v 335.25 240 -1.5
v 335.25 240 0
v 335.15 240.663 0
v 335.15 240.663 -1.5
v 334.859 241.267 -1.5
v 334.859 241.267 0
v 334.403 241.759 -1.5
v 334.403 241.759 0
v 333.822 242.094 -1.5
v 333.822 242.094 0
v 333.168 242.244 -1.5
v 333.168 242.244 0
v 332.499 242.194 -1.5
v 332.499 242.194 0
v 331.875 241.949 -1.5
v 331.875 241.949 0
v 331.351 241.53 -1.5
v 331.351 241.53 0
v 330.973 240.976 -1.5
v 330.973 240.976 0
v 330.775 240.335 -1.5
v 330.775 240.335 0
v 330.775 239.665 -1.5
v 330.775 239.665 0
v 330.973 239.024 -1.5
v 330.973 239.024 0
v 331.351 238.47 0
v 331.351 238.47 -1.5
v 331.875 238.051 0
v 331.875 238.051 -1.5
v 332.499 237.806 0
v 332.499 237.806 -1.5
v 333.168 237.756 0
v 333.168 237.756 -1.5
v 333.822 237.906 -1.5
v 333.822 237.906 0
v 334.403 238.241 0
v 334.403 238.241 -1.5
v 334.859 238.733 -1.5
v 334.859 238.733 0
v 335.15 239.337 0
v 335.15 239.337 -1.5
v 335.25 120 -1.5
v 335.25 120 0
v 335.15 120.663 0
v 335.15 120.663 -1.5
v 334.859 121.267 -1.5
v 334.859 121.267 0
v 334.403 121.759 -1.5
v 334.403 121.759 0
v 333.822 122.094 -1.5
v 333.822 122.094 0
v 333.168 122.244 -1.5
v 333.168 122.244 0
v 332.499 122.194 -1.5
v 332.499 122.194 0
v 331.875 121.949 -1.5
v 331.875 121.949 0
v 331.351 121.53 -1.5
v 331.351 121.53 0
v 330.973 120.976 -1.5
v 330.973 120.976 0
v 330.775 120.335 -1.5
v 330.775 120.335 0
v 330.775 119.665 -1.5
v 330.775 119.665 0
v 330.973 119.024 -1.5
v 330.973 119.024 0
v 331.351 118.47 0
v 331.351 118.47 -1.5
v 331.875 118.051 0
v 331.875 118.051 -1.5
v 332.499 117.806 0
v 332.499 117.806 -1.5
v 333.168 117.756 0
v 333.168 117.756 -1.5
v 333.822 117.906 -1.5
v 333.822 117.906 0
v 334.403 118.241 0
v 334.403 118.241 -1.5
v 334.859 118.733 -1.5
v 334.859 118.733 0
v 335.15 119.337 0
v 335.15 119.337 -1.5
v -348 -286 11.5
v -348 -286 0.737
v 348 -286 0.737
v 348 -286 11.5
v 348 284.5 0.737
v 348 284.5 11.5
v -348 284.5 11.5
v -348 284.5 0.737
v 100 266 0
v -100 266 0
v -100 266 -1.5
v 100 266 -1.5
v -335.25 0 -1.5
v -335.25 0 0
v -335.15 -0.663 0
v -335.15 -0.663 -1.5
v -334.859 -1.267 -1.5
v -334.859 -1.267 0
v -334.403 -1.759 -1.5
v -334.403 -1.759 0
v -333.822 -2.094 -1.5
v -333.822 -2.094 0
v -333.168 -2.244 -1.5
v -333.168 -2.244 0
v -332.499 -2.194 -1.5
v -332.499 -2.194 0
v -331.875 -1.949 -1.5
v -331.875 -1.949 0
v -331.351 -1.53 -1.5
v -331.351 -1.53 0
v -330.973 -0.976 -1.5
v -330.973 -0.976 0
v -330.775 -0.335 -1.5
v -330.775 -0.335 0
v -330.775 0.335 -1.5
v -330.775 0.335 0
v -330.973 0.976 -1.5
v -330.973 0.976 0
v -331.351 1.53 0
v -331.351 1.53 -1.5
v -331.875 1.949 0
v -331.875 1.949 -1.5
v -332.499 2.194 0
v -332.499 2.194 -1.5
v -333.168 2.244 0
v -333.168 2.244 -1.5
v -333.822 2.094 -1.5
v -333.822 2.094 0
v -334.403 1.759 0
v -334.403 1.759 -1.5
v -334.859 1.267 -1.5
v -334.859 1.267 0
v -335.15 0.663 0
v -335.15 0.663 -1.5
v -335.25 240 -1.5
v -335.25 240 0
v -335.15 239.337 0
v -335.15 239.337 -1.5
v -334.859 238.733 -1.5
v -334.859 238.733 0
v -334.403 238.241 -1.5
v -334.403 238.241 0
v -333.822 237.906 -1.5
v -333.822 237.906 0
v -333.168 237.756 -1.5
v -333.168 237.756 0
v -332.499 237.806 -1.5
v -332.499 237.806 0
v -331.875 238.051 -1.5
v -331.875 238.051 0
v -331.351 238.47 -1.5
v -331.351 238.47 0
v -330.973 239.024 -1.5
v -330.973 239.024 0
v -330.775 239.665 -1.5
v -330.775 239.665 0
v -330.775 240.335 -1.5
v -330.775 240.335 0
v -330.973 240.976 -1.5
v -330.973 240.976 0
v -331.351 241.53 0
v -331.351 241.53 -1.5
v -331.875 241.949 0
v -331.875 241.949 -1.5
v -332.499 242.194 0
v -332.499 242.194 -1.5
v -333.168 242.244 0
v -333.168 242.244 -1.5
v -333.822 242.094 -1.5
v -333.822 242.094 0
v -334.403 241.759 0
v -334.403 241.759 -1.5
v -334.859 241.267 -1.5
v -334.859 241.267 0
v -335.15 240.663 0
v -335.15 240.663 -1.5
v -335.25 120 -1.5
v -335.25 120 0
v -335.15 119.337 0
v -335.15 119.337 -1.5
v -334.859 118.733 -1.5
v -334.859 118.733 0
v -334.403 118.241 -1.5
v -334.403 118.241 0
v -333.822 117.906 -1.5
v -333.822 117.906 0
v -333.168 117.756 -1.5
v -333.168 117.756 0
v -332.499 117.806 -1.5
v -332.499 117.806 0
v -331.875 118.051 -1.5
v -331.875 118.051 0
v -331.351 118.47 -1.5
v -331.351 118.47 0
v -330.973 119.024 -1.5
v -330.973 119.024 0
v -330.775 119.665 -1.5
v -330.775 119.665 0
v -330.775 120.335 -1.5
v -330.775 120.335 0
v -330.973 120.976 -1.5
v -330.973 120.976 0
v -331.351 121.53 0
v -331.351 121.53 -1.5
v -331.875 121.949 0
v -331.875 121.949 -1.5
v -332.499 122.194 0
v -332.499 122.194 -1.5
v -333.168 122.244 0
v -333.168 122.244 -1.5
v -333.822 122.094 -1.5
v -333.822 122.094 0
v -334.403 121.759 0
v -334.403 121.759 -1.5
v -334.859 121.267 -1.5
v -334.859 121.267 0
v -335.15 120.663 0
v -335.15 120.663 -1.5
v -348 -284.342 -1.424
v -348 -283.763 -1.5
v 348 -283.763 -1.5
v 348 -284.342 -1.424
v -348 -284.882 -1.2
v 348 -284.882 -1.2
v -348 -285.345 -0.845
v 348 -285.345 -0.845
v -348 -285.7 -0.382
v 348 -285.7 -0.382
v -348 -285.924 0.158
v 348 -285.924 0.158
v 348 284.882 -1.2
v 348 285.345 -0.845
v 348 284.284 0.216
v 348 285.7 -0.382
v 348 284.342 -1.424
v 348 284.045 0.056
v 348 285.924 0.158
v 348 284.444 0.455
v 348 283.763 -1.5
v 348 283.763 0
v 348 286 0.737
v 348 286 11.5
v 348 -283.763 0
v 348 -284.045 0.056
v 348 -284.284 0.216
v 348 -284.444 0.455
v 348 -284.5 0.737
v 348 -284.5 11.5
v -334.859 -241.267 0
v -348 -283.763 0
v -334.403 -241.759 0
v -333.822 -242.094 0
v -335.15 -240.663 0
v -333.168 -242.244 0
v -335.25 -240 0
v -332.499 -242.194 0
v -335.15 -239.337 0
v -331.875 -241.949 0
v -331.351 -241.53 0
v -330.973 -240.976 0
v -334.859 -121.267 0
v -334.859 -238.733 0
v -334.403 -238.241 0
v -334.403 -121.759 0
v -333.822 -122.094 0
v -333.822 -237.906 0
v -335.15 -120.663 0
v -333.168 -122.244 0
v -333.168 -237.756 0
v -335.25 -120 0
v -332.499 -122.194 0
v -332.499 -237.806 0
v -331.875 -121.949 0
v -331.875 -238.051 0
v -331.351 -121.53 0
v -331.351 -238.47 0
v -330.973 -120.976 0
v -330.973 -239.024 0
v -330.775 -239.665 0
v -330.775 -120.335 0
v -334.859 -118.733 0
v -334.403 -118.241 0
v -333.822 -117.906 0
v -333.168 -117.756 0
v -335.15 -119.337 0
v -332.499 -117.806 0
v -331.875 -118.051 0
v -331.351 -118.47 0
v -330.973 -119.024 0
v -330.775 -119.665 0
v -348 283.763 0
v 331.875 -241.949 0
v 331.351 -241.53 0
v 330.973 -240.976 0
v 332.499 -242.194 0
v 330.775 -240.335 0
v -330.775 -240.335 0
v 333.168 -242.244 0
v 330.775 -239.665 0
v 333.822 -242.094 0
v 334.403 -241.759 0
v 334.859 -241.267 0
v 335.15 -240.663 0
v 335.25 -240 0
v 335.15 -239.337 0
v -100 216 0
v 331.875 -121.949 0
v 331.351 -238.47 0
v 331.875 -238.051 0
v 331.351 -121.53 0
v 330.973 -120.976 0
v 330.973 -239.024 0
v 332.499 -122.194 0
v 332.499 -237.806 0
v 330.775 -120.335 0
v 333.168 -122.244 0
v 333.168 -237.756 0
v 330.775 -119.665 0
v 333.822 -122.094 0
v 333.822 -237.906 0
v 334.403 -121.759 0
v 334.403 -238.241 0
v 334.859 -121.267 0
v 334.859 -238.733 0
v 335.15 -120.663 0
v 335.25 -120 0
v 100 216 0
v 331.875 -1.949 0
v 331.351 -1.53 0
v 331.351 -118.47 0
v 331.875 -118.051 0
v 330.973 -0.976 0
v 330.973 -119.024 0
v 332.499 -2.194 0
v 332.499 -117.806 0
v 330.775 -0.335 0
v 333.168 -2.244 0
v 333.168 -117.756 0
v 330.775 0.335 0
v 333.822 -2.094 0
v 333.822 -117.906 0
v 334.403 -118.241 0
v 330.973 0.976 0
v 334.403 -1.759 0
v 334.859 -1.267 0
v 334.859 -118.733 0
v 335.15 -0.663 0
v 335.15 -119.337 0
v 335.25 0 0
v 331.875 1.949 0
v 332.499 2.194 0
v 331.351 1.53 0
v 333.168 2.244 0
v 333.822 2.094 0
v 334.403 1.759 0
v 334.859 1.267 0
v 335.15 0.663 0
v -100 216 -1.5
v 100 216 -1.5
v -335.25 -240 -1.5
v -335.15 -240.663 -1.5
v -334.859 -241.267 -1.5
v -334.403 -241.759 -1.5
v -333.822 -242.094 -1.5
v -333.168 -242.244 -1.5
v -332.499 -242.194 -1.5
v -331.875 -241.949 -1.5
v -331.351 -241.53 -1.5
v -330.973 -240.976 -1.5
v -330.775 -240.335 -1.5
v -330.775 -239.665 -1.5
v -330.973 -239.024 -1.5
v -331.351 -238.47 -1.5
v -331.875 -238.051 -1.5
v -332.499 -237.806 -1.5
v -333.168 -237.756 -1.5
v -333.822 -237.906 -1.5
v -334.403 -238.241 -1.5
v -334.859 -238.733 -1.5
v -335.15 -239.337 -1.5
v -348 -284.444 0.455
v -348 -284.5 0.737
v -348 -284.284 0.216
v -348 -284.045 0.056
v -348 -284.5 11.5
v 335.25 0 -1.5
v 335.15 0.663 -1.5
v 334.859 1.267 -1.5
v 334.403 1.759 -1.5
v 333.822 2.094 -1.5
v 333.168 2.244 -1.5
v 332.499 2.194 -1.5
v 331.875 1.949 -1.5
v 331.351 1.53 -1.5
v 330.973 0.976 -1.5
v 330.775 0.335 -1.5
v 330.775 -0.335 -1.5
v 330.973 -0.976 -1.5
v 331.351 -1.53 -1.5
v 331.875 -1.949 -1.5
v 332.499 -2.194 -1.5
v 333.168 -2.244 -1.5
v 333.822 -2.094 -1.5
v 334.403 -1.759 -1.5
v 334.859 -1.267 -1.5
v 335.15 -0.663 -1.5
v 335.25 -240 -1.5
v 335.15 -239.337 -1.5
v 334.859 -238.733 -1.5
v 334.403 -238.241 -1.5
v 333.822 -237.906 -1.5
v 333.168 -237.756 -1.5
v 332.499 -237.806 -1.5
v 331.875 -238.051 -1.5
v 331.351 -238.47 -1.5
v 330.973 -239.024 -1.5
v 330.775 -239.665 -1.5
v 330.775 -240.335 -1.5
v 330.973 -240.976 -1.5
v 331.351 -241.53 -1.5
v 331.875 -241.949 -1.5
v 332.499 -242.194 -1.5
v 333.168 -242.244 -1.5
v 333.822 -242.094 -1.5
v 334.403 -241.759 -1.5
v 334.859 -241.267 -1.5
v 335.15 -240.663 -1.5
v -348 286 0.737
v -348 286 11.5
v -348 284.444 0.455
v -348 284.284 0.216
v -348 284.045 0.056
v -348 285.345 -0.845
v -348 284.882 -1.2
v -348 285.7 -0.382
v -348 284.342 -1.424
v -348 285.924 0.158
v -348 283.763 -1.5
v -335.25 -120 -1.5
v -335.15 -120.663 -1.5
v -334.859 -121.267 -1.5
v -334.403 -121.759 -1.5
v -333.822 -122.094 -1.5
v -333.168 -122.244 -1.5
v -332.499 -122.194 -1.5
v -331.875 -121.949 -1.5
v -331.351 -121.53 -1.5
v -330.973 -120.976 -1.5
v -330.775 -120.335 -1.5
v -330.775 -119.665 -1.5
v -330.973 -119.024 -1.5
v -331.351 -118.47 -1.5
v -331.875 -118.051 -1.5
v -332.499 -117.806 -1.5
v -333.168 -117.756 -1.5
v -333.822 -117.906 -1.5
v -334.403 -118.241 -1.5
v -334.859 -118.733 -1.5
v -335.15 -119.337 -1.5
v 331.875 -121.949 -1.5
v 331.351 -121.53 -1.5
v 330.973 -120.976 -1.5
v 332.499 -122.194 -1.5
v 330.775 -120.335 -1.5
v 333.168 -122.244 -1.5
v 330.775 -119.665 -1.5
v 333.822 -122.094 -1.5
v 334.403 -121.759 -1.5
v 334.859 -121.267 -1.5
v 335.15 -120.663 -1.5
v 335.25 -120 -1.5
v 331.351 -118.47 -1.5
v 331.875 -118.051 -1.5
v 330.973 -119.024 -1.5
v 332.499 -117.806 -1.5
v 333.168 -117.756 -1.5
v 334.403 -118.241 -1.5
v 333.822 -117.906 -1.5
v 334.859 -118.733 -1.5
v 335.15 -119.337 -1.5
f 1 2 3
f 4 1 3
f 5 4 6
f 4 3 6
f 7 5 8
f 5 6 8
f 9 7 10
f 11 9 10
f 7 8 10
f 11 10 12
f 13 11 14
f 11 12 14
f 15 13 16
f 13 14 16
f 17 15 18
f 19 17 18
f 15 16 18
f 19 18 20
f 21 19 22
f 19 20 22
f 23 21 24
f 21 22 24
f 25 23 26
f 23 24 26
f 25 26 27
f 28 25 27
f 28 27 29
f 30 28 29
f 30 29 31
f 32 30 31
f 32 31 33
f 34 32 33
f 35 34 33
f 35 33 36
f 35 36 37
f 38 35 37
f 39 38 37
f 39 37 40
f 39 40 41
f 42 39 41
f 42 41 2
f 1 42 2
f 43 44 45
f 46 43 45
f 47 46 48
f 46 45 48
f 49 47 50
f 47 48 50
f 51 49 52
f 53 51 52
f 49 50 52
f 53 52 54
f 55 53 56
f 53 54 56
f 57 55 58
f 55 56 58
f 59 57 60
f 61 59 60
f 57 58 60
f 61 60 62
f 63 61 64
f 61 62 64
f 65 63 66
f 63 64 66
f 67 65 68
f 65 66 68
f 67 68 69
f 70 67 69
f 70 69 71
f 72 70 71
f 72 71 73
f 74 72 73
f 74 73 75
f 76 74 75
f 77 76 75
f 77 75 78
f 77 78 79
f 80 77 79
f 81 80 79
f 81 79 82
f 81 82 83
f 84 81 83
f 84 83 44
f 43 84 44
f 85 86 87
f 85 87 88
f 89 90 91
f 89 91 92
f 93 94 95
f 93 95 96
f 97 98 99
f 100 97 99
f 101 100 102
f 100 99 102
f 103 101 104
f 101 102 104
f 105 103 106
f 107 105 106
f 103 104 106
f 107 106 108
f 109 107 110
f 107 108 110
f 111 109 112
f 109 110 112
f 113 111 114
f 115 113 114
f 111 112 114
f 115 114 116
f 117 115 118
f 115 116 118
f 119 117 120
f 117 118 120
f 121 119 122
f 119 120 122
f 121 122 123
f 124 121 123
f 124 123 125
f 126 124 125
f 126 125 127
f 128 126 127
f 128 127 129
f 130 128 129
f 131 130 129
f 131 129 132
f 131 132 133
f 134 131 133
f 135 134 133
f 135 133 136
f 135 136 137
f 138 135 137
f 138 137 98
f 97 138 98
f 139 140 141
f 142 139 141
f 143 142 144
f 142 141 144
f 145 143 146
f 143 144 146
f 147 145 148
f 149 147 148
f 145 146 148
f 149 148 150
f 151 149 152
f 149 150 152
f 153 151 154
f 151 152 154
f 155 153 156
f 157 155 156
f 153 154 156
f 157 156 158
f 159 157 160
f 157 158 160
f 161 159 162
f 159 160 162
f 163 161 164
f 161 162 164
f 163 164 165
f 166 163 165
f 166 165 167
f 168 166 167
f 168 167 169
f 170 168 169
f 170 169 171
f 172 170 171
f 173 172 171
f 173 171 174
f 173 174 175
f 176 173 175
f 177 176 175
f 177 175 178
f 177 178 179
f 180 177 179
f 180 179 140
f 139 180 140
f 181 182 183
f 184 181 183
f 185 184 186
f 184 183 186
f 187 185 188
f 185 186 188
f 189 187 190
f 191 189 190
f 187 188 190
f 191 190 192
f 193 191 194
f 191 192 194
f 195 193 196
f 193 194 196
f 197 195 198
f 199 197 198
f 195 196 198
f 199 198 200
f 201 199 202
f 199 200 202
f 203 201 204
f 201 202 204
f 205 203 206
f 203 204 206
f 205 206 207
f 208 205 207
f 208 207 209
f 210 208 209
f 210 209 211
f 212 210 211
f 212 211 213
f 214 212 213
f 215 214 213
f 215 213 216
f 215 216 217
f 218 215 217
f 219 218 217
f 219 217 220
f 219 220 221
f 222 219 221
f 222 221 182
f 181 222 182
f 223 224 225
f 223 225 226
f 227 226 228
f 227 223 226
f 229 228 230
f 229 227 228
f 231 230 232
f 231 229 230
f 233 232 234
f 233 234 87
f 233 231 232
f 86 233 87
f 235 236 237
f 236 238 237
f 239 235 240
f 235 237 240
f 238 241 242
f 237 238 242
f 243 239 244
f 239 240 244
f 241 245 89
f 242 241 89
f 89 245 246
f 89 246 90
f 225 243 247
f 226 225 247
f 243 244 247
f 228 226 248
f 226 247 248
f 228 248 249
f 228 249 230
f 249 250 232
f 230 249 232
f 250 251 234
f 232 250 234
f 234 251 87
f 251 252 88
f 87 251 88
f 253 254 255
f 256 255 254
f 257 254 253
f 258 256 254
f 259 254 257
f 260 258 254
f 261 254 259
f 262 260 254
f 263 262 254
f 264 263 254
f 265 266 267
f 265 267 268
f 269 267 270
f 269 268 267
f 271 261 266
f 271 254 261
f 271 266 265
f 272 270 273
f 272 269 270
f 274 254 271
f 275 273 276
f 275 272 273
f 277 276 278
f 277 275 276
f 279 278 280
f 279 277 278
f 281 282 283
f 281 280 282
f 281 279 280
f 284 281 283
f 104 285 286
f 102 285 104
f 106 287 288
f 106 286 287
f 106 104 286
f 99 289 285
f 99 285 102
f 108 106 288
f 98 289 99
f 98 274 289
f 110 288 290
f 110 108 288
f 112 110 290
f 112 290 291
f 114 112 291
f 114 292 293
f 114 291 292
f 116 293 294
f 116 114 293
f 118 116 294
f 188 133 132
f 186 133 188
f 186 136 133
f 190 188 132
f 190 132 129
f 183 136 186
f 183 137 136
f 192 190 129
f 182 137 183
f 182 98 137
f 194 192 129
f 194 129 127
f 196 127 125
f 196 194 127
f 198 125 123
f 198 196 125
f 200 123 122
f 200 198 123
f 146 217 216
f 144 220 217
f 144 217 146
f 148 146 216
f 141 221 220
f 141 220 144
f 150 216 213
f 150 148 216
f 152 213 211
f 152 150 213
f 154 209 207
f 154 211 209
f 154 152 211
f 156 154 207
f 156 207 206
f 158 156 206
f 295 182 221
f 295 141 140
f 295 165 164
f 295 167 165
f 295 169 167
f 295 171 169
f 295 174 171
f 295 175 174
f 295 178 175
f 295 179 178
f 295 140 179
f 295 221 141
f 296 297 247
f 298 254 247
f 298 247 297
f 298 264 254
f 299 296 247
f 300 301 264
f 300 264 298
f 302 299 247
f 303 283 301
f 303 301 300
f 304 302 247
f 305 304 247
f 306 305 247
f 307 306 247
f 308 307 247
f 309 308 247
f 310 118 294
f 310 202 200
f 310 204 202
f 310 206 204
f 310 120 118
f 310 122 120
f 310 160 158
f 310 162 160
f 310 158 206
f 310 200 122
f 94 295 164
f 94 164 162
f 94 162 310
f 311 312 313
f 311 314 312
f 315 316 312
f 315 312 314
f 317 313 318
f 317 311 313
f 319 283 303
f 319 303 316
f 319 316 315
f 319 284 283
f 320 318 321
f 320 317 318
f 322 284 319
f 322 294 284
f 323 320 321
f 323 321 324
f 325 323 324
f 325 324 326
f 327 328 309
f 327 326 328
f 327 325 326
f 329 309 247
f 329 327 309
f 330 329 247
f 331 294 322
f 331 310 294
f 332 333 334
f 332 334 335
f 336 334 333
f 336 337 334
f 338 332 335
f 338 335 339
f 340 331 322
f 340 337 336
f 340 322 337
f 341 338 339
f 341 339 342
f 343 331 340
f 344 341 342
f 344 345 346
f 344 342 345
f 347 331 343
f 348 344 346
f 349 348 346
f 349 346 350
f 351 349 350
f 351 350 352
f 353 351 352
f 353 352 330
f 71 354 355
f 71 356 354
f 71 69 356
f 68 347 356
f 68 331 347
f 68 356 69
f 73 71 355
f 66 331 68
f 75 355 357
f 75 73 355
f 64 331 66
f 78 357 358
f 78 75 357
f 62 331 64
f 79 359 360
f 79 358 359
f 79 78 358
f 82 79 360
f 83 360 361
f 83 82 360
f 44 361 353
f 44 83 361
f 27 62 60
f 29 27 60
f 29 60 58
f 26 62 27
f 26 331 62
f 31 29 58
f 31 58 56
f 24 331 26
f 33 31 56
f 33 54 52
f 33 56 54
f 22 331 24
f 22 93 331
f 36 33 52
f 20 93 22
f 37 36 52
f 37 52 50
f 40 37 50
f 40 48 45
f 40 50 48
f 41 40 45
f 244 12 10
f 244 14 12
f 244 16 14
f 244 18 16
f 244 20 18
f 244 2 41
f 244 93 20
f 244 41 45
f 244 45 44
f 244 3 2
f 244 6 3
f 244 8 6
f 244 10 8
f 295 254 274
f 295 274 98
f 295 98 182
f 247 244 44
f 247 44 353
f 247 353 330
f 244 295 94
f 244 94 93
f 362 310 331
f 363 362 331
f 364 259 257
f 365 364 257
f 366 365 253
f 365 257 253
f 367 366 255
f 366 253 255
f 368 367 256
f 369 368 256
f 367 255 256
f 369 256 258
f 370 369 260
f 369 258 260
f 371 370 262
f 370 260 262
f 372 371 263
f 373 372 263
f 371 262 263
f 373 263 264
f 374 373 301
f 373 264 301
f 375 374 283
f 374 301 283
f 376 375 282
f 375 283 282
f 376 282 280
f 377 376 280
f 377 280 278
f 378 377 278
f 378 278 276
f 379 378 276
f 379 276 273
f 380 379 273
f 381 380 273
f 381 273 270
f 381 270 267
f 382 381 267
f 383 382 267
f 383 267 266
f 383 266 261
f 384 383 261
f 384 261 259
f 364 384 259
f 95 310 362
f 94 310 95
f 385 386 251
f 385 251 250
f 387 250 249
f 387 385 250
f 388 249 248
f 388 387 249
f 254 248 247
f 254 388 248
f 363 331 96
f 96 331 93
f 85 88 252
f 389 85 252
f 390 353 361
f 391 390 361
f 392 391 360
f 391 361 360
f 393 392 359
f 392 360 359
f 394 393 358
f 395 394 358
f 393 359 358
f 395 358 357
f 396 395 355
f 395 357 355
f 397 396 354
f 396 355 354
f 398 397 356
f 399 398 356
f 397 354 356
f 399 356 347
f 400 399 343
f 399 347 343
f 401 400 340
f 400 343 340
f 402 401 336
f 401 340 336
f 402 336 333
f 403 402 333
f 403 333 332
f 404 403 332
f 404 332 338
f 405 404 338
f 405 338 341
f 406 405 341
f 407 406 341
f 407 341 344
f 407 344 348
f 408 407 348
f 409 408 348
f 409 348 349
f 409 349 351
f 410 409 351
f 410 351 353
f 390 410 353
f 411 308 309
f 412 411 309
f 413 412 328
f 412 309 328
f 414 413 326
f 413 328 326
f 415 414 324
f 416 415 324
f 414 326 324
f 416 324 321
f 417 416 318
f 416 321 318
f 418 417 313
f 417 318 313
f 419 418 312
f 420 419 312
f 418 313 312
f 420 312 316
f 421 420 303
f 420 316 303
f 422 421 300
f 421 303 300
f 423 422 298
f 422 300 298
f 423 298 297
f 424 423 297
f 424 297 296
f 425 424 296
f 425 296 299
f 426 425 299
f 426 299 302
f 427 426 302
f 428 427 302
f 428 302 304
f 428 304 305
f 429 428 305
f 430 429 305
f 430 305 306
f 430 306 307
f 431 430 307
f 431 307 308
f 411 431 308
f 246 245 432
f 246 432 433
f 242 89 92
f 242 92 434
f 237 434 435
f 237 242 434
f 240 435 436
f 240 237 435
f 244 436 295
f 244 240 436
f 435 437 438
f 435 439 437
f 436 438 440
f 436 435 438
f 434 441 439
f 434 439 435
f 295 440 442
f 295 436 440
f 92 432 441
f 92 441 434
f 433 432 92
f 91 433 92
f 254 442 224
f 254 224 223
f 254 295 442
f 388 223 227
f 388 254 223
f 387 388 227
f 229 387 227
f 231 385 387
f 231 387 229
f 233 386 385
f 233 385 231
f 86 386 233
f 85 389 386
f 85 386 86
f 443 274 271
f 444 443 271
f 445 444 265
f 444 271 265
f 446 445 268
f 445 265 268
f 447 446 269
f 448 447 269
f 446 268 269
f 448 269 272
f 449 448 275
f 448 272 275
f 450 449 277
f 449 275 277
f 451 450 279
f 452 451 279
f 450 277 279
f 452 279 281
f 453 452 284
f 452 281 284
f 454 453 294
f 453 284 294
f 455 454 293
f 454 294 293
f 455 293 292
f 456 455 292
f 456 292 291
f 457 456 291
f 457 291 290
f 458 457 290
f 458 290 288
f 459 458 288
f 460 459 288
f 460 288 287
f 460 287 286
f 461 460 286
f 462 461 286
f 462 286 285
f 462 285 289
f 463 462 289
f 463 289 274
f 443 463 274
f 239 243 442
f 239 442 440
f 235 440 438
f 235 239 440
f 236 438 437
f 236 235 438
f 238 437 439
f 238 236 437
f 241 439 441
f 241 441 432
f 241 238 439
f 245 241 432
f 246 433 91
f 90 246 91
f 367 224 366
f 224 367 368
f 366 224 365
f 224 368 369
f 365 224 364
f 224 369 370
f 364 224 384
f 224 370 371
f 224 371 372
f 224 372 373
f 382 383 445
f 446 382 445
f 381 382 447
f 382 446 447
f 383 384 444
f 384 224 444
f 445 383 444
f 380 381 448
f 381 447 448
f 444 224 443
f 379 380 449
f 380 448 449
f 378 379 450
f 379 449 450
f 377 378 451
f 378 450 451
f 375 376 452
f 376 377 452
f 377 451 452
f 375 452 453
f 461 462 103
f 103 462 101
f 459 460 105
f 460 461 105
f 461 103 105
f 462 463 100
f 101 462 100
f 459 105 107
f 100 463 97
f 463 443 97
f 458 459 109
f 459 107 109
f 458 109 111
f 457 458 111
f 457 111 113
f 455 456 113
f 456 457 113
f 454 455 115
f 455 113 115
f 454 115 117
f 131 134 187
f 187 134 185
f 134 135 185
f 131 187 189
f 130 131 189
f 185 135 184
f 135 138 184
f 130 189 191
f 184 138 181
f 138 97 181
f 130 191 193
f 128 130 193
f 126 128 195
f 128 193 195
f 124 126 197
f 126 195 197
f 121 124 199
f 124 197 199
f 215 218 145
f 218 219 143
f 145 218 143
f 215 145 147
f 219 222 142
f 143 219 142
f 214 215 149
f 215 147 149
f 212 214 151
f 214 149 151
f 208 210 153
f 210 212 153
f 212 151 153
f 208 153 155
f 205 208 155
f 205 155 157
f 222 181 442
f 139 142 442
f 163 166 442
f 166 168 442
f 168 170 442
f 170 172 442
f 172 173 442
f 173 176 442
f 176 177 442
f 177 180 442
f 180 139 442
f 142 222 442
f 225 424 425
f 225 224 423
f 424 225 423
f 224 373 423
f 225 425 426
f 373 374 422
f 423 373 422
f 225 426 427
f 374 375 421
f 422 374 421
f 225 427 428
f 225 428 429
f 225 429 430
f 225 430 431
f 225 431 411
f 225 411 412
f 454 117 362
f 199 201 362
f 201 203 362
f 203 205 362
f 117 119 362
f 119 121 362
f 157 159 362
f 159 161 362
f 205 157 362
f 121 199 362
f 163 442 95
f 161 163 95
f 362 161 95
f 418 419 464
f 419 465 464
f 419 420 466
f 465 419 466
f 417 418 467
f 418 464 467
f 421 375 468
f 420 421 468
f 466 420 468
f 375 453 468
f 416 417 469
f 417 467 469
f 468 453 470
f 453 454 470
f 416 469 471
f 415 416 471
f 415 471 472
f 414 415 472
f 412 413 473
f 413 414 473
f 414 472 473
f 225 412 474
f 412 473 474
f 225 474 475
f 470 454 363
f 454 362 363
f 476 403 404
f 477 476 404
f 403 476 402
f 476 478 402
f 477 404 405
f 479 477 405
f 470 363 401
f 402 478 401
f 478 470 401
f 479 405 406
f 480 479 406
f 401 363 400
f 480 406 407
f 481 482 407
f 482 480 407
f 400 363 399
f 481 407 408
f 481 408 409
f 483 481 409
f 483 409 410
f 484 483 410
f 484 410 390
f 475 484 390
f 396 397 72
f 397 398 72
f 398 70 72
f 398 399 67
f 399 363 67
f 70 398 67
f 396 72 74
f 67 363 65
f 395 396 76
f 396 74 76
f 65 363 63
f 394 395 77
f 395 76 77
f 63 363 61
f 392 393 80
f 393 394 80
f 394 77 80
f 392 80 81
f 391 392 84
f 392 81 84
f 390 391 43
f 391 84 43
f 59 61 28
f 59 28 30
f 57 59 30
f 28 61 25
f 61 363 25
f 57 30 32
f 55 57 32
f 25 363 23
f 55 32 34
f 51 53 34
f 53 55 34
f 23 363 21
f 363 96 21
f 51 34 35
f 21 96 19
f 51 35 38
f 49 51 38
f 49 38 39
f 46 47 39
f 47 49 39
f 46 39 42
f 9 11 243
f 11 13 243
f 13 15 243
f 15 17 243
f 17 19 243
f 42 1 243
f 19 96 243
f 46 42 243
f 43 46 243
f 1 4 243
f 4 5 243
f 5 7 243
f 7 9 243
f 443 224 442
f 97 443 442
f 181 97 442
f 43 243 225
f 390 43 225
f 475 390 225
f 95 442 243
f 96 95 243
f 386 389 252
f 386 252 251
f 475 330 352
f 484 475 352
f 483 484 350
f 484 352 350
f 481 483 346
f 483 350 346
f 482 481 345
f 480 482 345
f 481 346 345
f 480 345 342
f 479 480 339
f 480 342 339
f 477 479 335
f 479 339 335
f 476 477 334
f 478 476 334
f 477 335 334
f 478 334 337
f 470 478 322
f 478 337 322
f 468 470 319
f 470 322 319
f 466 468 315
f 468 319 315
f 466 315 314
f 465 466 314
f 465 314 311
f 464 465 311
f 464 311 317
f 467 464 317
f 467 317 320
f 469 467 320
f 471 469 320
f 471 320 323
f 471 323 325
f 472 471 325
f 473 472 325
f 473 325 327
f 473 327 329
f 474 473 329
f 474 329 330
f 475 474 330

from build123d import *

# Parameters (mm, degrees)
SKETCH_1_W                         = 696
SKETCH_1_H                         = 572
SM_BASE_FLANGE_1_DEPTH             = 1.5
SM_EDGE_FLANGE_1_STRIP_W           = 7.4732
SM_EDGE_FLANGE_1_STRIP_H           = 1.5
SM_EDGE_FLANGE_1_STRIP_CUT_DEPTH   = 696
SM_EDGE_FLANGE_1_STRIP_2_W         = 7.4732
SM_EDGE_FLANGE_1_STRIP_2_H         = 1.5
SM_EDGE_FLANGE_1_STRIP_CUT_2_DEPTH = 696
SM_EDGE_FLANGE_1_DEPTH             = 696
SM_EDGE_FLANGE_1_BEND_DEPTH        = 696
SKETCH_8_R                         = 2.25
CUT_EXTRUDE_1_DEPTH                = 10
PATTERN_LINEAR_1_COUNT             = 3
PATTERN_LINEAR_1_PITCH             = 120
PATTERN_LINEAR_1_COL_COUNT         = 3
PATTERN_LINEAR_1_COL_PITCH         = 120
SKETCH_9_W                         = 200
SKETCH_9_H                         = 50
CUT_EXTRUDE_2_DEPTH                = 10


# Sheet-metal steps are written as plain solids
with BuildPart() as part:
    # Sketch 1 → Базовая кромка1 (new body)
    with BuildSketch(Plane.XY):
        Rectangle(SKETCH_1_W, SKETCH_1_H)
    extrude(amount=-SM_BASE_FLANGE_1_DEPTH)

    # Ребро-кромка1 strip (across the edge) → Ребро-кромка1 strip cut (cut)
    with BuildSketch(Plane(origin=(348, 286, 0), x_dir=(0, -1, 0), z_dir=(-1, 0, 0))):
        with Locations((-1.5, -0.75)):
            Rectangle(SM_EDGE_FLANGE_1_STRIP_W, SM_EDGE_FLANGE_1_STRIP_H)
    extrude(amount=SM_EDGE_FLANGE_1_STRIP_CUT_DEPTH, mode=Mode.SUBTRACT)

    # Ребро-кромка1 strip 2 (across the edge) → Ребро-кромка1 strip cut 2 (cut)
    with BuildSketch(Plane(origin=(-348, -286, 0), x_dir=(0, 1, 0), z_dir=(1, 0, 0))):
        with Locations((-1.5, -0.75)):
            Rectangle(SM_EDGE_FLANGE_1_STRIP_2_W, SM_EDGE_FLANGE_1_STRIP_2_H)
    extrude(amount=SM_EDGE_FLANGE_1_STRIP_CUT_2_DEPTH, mode=Mode.SUBTRACT)

    # Ребро-кромка1 section (across the edge) → Ребро-кромка1 (add)
    with BuildSketch(Plane(origin=(348, 286, 0), x_dir=(0, -1, 0), z_dir=(-1, 0, 0))):
        with BuildLine():
            Line((0, 0.7366), (0, 11.5))
            Line((0, 11.5), (1.5, 11.5))
            Line((1.5, 11.5), (1.5, 0.7366))
            ThreePointArc((1.5, 0.7366), (1.715745145, 0.215745145), (2.2366, 0))
            Line((2.2366, 0), (2.2366, -1.5))
            ThreePointArc((2.2366, -1.5), (0.655084973, -0.844915027), (0, 0.7366))
        make_face()
    extrude(amount=SM_EDGE_FLANGE_1_DEPTH)

    # Ребро-кромка1 section 2 (across the edge) → Ребро-кромка1 bend (add)
    with BuildSketch(Plane(origin=(-348, -286, 0), x_dir=(0, 1, 0), z_dir=(1, 0, 0))):
        with BuildLine():
            Line((0, 0.7366), (0, 11.5))
            Line((0, 11.5), (1.5, 11.5))
            Line((1.5, 11.5), (1.5, 0.7366))
            ThreePointArc((1.5, 0.7366), (1.715745145, 0.215745145), (2.2366, 0))
            Line((2.2366, 0), (2.2366, -1.5))
            ThreePointArc((2.2366, -1.5), (0.655084973, -0.844915027), (0, 0.7366))
        make_face()
    extrude(amount=SM_EDGE_FLANGE_1_BEND_DEPTH)

    # Эскиз8 → Вырез-Вытянуть1 (cut)
    with BuildSketch(Plane.XY):
        with Locations((333, 0)):
            Circle(SKETCH_8_R)
        with Locations(Location((-333, 0, 0), (0, 0, 180))):
            Circle(SKETCH_8_R)
    cut_extrude_1 = extrude(amount=-CUT_EXTRUDE_1_DEPTH, mode=Mode.SUBTRACT)

    # Линейный массив1: Вырез-Вытянуть1 ×3
    with Locations(*[(0, -i * PATTERN_LINEAR_1_PITCH, 0) for i in range(1, PATTERN_LINEAR_1_COUNT)]):
        add(cut_extrude_1, mode=Mode.SUBTRACT)

    # Линейный массив1 col: Вырез-Вытянуть1 ×3
    with Locations(*[(0, i * PATTERN_LINEAR_1_COL_PITCH, 0) for i in range(1, PATTERN_LINEAR_1_COL_COUNT)]):
        add(cut_extrude_1, mode=Mode.SUBTRACT)

    # Эскиз9 → Вырез-Вытянуть2 (cut)
    with BuildSketch(Plane.XY):
        with Locations((0, 241)):
            Rectangle(SKETCH_9_W, SKETCH_9_H)
    extrude(amount=-CUT_EXTRUDE_2_DEPTH, mode=Mode.SUBTRACT)


solid = part.part
